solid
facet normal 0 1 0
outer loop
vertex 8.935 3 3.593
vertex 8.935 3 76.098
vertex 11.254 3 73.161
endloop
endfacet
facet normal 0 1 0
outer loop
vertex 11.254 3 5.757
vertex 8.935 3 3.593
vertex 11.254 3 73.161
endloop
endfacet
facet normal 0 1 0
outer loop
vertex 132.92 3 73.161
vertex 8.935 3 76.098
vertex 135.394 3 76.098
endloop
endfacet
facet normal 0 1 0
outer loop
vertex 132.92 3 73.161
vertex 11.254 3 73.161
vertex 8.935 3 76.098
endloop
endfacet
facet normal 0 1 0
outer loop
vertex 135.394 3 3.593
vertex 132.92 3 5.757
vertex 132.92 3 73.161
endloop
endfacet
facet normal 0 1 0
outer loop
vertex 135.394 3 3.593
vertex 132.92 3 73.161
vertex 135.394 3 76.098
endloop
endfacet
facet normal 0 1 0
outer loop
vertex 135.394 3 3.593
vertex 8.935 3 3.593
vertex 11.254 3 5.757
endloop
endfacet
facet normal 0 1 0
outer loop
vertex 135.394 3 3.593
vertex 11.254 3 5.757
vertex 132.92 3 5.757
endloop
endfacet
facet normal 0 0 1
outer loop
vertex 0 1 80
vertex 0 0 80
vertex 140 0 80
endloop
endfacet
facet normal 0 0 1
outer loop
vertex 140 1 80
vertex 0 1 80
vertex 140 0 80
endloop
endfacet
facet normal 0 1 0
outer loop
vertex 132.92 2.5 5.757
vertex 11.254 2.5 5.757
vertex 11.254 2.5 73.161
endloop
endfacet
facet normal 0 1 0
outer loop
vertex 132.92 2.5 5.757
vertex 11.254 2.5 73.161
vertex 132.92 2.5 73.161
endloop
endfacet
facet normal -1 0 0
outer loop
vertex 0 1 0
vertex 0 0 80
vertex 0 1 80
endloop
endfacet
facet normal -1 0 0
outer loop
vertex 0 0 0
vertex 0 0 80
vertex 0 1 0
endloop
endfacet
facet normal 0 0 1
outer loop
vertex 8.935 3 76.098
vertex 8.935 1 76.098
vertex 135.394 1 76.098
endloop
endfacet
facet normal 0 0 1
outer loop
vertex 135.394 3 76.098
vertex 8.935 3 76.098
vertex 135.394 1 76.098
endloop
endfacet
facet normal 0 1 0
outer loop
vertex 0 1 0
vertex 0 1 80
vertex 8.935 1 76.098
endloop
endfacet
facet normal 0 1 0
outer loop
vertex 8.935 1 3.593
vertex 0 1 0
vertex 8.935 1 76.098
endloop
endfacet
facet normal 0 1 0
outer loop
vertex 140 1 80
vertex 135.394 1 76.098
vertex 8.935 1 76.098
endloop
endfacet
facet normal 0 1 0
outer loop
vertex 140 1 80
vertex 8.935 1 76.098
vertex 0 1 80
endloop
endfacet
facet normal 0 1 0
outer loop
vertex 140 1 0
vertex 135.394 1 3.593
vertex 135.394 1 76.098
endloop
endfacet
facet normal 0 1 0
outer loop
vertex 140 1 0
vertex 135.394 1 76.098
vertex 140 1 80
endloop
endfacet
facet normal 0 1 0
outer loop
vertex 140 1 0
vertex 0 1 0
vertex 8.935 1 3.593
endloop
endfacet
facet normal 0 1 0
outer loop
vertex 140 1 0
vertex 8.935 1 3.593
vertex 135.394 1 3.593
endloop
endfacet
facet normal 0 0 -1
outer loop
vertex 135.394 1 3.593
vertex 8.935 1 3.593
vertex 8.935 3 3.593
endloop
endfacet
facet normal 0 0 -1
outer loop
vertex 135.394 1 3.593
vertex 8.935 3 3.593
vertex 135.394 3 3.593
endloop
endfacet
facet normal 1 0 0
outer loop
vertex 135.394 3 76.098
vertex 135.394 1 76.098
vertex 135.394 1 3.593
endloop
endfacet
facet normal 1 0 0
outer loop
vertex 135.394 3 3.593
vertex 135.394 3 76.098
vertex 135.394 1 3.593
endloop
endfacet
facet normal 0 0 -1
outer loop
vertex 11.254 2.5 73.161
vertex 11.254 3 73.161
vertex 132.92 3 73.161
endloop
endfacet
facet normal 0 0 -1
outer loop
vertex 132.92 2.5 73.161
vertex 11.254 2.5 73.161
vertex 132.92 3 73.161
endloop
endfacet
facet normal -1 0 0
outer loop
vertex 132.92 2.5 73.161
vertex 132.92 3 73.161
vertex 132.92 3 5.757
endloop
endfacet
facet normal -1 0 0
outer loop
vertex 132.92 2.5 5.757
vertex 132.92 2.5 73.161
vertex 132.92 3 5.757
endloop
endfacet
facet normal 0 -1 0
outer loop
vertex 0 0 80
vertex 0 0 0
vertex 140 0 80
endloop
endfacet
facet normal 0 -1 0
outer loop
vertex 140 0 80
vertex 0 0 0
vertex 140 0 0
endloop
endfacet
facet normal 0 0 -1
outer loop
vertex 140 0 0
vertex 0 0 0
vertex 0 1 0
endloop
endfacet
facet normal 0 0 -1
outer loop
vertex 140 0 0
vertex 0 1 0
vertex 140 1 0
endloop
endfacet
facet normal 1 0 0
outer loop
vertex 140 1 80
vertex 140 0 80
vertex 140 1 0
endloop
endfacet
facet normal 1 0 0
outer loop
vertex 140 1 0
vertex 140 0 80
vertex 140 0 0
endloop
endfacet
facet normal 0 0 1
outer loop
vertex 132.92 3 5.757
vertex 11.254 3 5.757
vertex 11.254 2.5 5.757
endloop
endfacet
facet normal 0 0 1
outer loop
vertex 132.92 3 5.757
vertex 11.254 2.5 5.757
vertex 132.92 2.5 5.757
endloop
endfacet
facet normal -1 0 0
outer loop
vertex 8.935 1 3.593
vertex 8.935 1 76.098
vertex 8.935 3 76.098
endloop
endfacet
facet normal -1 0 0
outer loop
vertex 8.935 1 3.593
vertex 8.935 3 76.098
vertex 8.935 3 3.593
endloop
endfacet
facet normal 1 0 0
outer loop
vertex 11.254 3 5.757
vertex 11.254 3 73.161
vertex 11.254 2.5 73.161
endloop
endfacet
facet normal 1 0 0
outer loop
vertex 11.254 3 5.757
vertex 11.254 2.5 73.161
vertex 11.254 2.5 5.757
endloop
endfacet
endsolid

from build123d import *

# Parameters (mm, degrees)
SKETCH_1_W          = 140
SKETCH_1_H          = 80
EXTRUDE_1_DEPTH     = 1
SKETCH_2_W          = 126.458639074
SKETCH_2_H          = 72.505014335
EXTRUDE_2_DEPTH     = 2
SKETCH_3_W          = 121.666196763
SKETCH_3_H          = 67.403382197
CUT_EXTRUDE_1_DEPTH = 0.5


with BuildPart() as part:
    # 草图1 → 凸台-拉伸1 (new body)
    with BuildSketch(Plane(origin=(0, 0, 0), x_dir=(1, 0, 0), z_dir=(0, 1, 0))):
        with Locations((70, -40)):
            Rectangle(SKETCH_1_W, SKETCH_1_H)
    extrude(amount=EXTRUDE_1_DEPTH)

    # 草图2 → 凸台-拉伸2 (add)
    with BuildSketch(Plane(origin=(0, 1, 0), x_dir=(1, 0, 0), z_dir=(0, 1, 0))):
        with Locations((72.164328786, -39.845405087)):
            Rectangle(SKETCH_2_W, SKETCH_2_H)
    extrude(amount=EXTRUDE_2_DEPTH)

    # 草图3 → 切除-拉伸1 (cut)
    with BuildSketch(Plane(origin=(0, 3, 0), x_dir=(1, 0, 0), z_dir=(0, 1, 0))):
        with Locations((72.08703133, -39.458917804)):
            Rectangle(SKETCH_3_W, SKETCH_3_H)
    extrude(amount=-CUT_EXTRUDE_1_DEPTH, mode=Mode.SUBTRACT)


solid = part.part
